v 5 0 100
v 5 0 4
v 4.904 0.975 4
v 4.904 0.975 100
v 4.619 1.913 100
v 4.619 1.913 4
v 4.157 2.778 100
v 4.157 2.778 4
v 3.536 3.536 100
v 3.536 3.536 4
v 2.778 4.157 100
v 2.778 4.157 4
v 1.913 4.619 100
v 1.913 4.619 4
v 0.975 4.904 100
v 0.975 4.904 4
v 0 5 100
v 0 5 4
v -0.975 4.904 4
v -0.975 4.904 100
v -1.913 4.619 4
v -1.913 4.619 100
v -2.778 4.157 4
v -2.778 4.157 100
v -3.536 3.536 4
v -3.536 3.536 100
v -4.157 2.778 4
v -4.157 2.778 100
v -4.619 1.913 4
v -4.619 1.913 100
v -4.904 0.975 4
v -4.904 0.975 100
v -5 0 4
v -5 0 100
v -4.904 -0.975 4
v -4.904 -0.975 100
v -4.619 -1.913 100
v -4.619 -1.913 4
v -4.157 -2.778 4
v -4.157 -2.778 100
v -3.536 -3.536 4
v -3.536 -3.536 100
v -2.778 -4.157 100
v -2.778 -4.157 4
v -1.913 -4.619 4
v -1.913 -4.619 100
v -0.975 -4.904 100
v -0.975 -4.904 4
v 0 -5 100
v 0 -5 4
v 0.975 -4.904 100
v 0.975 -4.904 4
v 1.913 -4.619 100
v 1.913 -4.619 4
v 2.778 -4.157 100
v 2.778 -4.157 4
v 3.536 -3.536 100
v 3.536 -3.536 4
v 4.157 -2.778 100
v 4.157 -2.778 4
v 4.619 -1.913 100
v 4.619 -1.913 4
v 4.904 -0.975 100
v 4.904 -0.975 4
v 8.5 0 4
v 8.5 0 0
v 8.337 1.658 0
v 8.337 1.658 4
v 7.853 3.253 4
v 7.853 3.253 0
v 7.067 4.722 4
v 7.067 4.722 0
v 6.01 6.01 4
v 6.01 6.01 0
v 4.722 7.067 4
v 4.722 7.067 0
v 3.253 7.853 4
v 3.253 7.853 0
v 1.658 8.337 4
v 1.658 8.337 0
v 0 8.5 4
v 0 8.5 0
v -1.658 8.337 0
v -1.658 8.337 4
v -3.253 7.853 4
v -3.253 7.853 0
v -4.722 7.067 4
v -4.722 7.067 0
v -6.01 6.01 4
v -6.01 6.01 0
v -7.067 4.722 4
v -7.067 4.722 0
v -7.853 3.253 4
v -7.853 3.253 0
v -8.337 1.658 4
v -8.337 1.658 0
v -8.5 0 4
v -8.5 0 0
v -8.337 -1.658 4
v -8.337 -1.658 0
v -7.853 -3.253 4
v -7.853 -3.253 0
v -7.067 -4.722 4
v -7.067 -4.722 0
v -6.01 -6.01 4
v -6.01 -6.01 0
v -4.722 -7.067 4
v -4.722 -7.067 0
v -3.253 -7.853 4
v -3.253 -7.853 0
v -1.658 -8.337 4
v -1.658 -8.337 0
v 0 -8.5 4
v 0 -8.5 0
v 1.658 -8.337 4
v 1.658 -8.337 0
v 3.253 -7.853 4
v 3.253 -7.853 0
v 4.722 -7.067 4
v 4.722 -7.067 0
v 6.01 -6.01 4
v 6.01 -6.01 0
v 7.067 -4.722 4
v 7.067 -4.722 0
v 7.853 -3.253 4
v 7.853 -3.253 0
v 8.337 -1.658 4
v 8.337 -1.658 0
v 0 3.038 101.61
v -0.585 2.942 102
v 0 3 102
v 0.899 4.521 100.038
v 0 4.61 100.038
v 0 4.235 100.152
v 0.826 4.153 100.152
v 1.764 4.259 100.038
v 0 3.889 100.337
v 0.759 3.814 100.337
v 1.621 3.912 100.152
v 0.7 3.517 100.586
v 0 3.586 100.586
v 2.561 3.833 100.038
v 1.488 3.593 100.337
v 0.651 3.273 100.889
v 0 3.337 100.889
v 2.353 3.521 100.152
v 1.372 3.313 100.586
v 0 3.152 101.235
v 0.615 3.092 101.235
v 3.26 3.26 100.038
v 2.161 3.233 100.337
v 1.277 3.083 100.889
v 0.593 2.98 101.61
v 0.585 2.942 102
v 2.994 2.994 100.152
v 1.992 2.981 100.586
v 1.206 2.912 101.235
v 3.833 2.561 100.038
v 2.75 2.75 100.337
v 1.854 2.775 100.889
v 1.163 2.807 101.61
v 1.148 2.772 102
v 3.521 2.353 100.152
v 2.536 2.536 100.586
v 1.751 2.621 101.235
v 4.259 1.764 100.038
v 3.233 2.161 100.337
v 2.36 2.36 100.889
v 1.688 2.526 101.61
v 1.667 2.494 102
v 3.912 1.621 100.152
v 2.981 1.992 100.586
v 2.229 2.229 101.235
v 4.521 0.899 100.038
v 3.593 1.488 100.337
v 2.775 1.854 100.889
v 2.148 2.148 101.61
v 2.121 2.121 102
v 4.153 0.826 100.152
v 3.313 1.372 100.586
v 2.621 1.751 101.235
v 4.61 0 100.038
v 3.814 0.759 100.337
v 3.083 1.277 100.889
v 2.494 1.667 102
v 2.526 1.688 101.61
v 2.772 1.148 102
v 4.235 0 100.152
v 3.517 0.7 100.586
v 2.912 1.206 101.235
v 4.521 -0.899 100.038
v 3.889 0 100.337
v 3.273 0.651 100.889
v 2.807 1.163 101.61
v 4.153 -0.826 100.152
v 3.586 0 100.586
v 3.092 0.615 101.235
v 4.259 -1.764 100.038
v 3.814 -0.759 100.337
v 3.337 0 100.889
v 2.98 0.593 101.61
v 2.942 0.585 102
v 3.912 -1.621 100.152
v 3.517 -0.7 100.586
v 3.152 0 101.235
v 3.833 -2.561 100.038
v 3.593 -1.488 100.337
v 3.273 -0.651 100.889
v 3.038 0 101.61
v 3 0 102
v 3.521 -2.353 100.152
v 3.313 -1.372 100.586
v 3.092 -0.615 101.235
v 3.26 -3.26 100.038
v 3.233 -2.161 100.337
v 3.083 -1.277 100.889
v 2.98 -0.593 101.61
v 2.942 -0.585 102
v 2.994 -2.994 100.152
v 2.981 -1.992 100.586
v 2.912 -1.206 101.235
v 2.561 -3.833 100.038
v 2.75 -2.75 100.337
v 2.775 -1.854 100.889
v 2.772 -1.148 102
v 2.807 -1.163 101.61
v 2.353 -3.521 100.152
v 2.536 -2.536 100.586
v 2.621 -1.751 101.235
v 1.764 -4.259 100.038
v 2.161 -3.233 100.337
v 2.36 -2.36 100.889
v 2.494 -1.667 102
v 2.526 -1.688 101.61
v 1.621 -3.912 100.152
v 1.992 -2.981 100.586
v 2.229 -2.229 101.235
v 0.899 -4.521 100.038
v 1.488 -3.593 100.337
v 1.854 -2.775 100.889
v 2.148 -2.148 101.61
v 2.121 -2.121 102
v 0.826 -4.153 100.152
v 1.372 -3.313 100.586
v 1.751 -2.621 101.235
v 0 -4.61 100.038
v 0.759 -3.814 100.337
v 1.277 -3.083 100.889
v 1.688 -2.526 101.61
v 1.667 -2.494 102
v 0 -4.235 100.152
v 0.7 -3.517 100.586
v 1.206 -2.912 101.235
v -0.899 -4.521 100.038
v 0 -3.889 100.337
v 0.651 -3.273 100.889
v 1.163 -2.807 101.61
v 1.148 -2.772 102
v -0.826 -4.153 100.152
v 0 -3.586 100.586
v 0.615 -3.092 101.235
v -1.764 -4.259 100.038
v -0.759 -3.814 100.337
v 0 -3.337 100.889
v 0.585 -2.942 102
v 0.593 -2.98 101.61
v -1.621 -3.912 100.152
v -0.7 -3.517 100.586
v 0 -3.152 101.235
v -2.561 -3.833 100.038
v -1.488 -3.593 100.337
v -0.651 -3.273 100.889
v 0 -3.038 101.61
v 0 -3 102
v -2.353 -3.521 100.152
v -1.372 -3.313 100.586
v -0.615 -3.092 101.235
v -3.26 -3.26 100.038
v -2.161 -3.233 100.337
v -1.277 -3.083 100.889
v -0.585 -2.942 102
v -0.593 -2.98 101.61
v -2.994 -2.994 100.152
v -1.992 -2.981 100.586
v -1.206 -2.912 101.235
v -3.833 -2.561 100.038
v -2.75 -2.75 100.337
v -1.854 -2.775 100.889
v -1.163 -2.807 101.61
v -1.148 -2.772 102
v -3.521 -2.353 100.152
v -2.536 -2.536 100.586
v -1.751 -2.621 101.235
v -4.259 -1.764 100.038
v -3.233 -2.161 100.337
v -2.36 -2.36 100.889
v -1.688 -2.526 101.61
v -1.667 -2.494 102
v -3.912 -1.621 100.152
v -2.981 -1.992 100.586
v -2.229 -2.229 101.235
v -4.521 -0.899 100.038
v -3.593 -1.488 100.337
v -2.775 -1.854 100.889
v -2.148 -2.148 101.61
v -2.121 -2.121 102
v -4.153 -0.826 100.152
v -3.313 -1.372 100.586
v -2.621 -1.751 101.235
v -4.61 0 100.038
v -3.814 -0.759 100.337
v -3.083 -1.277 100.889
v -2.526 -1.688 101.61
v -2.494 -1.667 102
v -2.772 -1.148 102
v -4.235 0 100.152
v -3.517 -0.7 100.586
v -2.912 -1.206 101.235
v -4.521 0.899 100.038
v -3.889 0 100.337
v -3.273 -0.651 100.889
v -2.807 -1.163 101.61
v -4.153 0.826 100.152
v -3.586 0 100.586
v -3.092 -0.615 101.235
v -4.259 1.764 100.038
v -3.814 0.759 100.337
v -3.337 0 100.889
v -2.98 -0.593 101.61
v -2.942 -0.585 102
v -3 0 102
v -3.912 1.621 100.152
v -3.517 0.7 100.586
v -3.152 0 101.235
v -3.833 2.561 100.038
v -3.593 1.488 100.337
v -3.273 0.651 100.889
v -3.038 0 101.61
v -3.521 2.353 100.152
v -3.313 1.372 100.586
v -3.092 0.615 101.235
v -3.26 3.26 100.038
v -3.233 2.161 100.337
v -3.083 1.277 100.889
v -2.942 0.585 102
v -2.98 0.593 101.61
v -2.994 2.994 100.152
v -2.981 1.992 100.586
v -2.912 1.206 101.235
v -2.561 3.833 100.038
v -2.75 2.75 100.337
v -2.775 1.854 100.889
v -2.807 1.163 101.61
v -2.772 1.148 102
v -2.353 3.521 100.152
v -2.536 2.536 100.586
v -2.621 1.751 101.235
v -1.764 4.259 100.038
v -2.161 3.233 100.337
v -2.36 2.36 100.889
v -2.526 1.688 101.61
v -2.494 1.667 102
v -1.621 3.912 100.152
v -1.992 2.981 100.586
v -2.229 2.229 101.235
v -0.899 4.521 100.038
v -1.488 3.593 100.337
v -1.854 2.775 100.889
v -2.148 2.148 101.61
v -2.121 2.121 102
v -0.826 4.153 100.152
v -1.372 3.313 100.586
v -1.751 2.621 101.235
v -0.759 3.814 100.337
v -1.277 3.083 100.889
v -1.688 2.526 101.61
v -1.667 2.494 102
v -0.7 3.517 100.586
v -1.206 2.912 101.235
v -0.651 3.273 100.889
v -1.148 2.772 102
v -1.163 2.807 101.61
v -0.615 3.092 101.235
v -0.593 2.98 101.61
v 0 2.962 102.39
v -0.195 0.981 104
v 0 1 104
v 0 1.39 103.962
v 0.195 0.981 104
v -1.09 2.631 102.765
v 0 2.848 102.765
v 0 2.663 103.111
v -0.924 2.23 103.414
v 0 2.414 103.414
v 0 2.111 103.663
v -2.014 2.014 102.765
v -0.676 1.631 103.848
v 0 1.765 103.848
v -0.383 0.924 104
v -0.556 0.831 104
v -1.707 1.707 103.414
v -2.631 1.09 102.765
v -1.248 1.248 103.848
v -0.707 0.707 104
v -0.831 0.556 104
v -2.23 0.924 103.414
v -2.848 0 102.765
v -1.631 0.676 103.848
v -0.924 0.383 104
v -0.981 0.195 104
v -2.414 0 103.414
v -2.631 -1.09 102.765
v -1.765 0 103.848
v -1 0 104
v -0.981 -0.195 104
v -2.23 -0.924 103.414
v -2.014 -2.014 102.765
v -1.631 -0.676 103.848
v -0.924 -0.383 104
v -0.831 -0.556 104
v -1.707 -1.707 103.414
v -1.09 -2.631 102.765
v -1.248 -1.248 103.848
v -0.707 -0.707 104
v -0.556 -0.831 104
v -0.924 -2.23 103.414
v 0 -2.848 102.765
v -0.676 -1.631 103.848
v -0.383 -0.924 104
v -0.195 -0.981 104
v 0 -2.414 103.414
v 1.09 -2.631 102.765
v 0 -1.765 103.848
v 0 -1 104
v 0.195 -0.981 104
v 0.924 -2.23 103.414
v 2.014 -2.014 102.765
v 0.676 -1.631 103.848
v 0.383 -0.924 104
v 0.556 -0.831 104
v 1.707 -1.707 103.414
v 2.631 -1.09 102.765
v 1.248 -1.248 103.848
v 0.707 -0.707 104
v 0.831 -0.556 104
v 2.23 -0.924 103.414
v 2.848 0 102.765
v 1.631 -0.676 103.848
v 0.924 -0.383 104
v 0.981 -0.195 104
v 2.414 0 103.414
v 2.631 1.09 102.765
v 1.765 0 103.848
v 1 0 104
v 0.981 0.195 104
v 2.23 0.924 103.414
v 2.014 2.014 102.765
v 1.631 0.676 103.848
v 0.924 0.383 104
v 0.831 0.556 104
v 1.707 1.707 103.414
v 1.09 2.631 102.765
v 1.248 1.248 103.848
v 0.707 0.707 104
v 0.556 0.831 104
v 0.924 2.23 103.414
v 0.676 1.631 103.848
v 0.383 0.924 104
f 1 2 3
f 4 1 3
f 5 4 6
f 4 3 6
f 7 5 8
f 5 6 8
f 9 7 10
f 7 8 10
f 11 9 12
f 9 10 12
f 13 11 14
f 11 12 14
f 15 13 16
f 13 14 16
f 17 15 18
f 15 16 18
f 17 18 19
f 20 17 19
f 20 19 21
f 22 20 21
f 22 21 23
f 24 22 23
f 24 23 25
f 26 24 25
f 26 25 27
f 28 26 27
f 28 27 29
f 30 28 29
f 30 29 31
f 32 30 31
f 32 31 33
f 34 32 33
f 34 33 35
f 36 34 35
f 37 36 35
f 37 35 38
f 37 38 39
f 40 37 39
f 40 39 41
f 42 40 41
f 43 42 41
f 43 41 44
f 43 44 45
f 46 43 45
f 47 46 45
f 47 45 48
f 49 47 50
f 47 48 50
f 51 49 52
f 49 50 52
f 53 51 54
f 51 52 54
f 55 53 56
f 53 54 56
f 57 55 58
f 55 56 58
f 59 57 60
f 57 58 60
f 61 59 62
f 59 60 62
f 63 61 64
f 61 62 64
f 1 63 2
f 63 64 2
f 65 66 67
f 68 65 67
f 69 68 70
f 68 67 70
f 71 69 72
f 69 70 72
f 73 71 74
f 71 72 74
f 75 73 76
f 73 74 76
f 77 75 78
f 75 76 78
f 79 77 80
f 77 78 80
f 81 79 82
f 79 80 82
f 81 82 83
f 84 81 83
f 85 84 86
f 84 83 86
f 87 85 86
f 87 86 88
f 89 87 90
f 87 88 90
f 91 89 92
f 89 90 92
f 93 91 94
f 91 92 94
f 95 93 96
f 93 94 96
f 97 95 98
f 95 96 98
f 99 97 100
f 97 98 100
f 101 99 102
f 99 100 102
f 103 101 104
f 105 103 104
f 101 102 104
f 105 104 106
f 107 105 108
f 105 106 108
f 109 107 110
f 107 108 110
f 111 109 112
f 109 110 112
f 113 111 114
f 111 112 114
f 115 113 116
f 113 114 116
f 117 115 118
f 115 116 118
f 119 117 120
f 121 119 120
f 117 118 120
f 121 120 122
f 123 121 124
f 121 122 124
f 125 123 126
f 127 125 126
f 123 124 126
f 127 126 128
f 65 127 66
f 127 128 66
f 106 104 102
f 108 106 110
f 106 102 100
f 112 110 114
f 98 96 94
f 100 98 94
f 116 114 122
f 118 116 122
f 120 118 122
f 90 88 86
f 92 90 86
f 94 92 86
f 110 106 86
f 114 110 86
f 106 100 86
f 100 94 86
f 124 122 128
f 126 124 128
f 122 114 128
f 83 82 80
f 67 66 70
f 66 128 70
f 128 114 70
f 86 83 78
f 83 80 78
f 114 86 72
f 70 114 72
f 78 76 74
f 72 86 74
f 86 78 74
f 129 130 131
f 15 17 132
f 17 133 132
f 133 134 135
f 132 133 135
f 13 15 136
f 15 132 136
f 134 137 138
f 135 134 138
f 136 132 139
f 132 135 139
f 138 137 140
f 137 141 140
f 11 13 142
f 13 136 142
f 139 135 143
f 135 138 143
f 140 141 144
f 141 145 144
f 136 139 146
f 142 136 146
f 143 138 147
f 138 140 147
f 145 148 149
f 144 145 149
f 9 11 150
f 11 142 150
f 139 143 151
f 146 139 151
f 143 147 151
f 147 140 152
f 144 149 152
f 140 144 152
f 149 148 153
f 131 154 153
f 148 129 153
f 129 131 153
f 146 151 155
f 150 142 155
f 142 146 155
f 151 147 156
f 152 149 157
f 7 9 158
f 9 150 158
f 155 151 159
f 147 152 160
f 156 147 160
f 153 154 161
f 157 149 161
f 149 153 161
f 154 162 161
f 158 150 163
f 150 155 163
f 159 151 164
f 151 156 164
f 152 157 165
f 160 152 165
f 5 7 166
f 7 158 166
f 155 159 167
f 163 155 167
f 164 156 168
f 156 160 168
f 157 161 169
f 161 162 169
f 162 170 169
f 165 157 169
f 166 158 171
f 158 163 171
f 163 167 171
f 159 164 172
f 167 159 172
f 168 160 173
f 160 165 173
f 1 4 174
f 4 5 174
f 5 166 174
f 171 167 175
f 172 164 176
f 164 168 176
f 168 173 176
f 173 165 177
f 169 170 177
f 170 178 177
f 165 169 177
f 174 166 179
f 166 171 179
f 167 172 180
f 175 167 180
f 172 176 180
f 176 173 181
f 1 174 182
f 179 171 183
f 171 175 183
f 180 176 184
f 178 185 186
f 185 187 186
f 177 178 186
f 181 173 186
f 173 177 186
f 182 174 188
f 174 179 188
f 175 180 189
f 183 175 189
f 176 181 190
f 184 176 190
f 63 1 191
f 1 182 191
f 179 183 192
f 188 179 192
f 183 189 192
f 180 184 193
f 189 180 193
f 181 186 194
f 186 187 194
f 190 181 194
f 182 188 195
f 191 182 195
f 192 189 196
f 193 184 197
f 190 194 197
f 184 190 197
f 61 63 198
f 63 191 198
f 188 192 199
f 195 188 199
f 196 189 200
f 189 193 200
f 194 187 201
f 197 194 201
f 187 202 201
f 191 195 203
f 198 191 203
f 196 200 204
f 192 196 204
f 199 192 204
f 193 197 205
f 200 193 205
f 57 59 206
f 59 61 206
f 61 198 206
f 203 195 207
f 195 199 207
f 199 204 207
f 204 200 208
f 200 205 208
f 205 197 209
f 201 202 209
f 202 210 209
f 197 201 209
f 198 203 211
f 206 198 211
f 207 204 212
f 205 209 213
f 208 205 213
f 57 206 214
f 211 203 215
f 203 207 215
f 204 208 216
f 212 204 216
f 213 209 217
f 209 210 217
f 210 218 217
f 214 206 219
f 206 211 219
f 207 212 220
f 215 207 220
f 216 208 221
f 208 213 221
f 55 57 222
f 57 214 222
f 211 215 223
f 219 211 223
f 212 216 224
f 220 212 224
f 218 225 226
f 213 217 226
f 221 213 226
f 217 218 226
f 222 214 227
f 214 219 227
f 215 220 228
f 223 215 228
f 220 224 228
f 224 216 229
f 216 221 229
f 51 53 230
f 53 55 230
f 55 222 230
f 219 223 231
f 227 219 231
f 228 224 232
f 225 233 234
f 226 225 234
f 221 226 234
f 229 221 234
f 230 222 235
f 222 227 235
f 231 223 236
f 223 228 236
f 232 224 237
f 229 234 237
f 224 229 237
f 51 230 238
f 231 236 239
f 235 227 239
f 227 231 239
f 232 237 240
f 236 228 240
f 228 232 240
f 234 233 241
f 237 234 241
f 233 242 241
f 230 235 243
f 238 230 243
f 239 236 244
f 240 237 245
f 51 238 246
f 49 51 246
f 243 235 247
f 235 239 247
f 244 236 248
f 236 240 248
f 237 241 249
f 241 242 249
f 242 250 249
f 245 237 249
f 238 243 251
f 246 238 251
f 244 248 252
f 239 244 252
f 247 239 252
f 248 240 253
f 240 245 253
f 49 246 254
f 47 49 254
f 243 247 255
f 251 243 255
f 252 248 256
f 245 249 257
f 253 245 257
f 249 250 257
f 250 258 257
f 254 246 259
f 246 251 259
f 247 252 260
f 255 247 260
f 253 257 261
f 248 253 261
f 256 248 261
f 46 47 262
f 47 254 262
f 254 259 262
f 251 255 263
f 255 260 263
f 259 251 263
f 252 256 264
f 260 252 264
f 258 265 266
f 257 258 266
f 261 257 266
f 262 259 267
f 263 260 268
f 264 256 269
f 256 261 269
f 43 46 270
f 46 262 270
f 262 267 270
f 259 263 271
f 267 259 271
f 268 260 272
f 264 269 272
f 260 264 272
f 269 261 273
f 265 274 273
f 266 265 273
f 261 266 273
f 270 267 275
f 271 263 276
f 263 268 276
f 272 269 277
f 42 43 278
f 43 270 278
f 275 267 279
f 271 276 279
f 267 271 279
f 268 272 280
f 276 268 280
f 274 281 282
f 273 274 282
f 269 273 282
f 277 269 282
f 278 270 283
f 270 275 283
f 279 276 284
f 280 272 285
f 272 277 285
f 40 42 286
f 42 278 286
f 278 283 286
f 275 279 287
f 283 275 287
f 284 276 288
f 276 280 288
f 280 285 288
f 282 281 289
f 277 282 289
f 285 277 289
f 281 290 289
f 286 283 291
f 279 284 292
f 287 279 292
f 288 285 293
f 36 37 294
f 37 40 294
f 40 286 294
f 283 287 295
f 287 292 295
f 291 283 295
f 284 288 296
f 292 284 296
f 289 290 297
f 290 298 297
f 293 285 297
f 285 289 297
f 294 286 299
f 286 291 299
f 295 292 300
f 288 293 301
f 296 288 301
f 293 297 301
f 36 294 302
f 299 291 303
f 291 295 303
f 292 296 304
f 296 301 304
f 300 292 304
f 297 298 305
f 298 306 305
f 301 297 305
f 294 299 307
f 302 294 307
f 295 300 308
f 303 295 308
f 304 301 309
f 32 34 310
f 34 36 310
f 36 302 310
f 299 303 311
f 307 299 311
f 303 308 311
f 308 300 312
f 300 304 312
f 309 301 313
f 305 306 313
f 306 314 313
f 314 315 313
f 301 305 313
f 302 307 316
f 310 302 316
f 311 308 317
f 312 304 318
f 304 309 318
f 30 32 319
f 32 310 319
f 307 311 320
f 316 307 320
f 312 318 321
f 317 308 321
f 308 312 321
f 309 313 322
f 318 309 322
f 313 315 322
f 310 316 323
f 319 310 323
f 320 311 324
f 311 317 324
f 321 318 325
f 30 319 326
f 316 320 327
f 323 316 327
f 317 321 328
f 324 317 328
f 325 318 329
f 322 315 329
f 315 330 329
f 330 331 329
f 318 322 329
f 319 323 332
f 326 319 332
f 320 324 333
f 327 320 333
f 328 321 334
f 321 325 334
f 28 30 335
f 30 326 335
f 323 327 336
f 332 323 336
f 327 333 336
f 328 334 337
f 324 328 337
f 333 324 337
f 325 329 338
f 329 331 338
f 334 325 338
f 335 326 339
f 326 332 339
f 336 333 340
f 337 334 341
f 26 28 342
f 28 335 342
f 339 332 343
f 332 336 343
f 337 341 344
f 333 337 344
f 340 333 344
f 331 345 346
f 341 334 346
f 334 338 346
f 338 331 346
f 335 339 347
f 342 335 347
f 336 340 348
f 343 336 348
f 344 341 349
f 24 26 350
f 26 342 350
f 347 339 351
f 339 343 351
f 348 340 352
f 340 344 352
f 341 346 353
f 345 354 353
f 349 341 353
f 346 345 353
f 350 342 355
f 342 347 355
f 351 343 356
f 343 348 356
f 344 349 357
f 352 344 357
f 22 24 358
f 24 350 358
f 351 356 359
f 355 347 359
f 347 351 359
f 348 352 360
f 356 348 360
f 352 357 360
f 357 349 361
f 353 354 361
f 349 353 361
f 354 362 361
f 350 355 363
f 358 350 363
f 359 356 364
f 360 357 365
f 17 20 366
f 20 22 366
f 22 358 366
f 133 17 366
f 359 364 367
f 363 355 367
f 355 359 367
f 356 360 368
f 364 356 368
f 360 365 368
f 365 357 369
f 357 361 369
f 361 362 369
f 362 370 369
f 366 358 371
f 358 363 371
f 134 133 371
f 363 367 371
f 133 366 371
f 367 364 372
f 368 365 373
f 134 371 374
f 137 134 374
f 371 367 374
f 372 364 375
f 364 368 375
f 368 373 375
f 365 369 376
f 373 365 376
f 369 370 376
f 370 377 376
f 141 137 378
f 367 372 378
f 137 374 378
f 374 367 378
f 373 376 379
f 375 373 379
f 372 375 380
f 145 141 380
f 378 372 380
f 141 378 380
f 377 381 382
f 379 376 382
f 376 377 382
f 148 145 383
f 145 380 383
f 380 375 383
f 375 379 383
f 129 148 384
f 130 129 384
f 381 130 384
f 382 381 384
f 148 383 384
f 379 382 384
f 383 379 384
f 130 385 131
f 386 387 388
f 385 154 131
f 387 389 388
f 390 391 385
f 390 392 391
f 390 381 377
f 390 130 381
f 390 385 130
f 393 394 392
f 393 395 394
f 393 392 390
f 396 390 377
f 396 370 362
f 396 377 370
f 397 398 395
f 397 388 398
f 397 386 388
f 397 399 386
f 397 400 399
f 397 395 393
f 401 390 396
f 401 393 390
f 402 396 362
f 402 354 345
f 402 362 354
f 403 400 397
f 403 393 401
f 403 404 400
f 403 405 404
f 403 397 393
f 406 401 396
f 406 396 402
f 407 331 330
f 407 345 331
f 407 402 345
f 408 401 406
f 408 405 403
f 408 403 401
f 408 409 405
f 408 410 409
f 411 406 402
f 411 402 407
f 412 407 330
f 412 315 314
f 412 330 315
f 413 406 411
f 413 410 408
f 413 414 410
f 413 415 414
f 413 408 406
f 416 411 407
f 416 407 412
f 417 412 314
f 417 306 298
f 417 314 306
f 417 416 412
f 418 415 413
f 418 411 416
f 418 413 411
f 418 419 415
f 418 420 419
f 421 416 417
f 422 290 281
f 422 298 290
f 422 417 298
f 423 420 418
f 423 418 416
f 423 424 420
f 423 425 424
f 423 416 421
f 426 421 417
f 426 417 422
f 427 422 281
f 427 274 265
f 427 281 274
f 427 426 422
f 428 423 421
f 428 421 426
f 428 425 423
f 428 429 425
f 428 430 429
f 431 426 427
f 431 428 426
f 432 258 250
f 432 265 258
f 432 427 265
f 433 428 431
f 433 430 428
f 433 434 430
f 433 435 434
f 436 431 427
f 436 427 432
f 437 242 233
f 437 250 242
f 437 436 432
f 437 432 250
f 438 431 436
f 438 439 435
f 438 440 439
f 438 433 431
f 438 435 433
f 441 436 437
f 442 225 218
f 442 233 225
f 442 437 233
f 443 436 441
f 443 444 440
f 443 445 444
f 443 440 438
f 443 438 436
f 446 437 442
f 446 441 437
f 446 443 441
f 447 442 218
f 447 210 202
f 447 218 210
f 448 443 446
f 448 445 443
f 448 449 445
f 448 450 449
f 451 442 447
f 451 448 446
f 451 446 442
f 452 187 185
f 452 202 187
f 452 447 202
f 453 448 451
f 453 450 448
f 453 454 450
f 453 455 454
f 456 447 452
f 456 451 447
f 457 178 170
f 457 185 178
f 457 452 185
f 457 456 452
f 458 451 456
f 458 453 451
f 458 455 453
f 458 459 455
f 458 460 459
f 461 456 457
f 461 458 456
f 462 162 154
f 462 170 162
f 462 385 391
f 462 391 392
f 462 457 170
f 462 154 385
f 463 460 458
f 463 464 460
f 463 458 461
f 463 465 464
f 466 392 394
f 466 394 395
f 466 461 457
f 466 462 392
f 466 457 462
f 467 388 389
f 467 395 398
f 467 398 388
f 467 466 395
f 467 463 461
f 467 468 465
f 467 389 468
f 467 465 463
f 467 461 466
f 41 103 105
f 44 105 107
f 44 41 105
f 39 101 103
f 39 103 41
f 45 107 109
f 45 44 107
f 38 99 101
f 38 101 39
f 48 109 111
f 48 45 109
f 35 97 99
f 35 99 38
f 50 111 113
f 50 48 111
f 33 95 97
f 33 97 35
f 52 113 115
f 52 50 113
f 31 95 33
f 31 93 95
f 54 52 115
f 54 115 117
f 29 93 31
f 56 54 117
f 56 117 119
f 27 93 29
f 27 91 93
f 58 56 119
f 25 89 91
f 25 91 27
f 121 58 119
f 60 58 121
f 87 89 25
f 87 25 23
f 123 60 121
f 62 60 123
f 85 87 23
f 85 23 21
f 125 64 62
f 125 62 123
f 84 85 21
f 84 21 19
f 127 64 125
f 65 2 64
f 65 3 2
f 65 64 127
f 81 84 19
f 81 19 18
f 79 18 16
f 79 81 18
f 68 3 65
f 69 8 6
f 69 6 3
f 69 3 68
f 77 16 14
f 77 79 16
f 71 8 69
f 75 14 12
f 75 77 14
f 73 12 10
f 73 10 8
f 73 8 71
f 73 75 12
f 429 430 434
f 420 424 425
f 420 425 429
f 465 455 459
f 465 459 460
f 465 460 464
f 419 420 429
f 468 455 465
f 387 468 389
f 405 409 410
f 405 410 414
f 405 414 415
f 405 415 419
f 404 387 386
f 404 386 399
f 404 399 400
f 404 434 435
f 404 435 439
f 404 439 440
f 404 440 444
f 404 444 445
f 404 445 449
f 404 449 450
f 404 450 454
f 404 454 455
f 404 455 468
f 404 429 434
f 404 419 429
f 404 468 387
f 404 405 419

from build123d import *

# Parameters (mm, degrees)
F0_R     = 8.5
F1_DEPTH = 4
F2_R     = 5
F3_DEPTH = 100


with BuildPart() as f1:
    # F0 (on Top) → F1 (new body)
    with BuildSketch(Plane.XY):
        Circle(F0_R)
    extrude(amount=F1_DEPTH)

    # F2 (on Top) → F3 (join)
    with BuildSketch(Plane.XY):
        Circle(F2_R)
    extrude(amount=F3_DEPTH)

    # F4 (on Right) → F5 (revolve)
    with BuildSketch(Plane.YZ):
        with BuildLine():
            Line((3, 102), (0, 102))
            Line((0, 102), (0, 100))
            Line((0, 100), (5, 100))
            ThreePointArc((5, 100), (3.585786, 100.585786), (3, 102))
        make_face()
    revolve(axis=Axis((0, 0, 101), (0, 0, -1)))

    # F6 (on Right) → F7 (revolve)
    with BuildSketch(Plane.YZ):
        with BuildLine():
            Line((0, 104), (0, 102))
            Line((0, 102), (3, 102))
            ThreePointArc((3, 102), (2.414214, 103.414214), (1, 104))
            Line((1, 104), (0, 104))
        make_face()
    revolve(axis=Axis((0, 0, 103), (0, 0, 1)))


solid = f1.part
